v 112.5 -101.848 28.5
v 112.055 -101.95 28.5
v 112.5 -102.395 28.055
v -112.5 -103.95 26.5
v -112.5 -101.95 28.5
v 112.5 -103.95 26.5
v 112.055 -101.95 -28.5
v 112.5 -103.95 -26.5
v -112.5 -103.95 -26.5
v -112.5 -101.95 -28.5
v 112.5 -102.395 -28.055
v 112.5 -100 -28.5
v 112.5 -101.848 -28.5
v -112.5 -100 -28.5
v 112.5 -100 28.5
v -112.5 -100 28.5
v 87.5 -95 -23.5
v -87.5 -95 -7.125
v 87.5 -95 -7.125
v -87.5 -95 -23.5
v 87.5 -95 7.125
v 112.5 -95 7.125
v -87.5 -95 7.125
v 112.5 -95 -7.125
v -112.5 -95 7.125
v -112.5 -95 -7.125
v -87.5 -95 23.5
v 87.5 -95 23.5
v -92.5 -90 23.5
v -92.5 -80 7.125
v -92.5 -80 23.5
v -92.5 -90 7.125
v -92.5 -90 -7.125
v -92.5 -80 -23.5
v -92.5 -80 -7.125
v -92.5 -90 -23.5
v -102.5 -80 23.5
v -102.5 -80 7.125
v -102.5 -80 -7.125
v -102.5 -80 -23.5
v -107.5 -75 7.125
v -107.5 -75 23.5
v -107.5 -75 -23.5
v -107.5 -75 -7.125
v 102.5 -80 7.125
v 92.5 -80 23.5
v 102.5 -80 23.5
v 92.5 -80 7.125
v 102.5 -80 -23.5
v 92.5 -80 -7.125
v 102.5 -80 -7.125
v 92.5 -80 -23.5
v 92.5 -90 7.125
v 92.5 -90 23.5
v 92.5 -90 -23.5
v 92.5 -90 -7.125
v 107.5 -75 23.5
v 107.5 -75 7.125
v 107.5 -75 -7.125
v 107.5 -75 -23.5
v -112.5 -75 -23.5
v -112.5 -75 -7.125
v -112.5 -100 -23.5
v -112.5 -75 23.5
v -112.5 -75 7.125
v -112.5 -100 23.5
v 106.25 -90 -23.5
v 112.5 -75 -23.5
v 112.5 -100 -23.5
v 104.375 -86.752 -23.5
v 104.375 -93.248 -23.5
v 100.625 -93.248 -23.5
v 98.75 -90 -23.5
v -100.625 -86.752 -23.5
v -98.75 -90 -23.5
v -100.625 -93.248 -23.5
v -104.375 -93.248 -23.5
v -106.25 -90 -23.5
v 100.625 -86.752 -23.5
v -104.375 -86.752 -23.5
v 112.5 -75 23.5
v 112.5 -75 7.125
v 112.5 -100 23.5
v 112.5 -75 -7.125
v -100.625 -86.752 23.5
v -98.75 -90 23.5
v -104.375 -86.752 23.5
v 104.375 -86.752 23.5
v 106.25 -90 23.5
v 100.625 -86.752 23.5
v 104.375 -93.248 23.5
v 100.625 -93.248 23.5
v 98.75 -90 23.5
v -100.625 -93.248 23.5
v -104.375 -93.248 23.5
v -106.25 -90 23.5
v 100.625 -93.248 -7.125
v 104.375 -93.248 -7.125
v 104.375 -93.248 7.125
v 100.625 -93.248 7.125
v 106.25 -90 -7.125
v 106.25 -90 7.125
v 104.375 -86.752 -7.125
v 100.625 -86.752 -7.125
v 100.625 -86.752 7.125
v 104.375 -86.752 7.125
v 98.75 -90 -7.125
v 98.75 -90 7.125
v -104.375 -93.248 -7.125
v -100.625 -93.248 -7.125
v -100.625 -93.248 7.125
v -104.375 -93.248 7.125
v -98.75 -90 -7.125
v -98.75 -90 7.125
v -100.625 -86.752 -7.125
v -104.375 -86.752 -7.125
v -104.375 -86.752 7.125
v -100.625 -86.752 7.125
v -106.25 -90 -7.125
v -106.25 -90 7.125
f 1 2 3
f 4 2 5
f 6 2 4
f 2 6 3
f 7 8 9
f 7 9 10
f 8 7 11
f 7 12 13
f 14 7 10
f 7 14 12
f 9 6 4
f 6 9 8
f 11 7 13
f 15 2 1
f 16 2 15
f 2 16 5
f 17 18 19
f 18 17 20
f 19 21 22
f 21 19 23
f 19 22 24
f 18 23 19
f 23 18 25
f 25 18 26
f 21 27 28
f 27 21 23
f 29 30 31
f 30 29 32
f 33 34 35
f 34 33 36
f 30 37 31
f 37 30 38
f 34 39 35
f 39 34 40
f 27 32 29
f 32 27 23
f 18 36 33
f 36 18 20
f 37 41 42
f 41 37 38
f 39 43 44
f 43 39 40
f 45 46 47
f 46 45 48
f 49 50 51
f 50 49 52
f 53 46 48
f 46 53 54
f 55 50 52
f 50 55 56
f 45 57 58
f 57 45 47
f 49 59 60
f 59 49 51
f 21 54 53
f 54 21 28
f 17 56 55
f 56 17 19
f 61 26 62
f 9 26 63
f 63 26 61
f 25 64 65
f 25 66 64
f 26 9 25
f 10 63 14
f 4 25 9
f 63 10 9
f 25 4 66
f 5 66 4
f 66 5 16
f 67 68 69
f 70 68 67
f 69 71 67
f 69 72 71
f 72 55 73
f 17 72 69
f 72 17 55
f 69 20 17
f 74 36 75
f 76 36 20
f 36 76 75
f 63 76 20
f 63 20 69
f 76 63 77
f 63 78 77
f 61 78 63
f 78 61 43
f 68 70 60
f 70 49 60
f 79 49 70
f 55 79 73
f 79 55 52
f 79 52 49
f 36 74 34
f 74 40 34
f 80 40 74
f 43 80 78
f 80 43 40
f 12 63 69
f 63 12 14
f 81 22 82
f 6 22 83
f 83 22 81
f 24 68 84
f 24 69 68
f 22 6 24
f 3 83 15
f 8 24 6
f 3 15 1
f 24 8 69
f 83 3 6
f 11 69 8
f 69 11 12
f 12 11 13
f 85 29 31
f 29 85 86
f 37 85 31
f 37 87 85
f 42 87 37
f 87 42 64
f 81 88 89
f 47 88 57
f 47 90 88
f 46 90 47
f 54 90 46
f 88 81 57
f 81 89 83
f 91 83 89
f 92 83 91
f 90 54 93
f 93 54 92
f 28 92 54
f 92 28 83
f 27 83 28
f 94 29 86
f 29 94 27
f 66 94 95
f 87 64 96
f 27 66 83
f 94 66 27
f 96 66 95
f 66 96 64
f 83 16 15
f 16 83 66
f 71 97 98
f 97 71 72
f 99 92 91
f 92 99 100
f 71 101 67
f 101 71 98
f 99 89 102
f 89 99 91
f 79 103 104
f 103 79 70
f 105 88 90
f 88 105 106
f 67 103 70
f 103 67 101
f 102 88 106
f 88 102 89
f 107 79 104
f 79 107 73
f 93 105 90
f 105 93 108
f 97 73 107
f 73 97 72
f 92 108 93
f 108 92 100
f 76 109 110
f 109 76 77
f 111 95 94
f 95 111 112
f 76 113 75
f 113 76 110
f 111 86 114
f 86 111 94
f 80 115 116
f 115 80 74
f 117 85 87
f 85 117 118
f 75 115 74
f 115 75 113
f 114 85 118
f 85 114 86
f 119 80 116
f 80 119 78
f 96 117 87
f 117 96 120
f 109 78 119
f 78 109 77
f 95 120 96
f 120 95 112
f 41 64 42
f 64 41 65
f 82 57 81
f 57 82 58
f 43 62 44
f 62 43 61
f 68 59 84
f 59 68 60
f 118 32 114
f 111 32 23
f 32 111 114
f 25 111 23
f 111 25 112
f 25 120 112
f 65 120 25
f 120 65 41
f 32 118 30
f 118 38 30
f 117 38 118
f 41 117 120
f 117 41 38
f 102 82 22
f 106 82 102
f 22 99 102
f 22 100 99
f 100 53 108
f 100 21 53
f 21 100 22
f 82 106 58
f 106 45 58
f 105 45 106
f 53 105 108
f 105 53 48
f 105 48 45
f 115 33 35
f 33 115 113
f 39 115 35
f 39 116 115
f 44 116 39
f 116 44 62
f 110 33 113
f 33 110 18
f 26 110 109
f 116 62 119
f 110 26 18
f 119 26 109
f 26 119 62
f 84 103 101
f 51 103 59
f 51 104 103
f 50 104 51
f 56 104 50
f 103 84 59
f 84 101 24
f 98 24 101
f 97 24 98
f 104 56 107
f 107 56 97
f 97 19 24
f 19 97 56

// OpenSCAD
// file: frame-left.scad
/*
 * SPDX-FileCopyrightText: © 2023 Brian S. Stephan <bss@incorporeal.org>
 * SPDX-License-Identifier: GPL-3.0-or-later
 */

include <parameters.scad>
include <components.scad>

module base_left_frame(lower=false) {
	difference() {
		frame(lower=lower);
		// chop the right edge off
		side_chopper();
	}
}

module left_frame(lower=false) {
	difference() {
		base_left_frame(lower=lower);
		// connection holes to other frames
		frame_connection_holes();

		// cable routing hole
		frame_cable_routing_hole();

		// aux button holes
		translate([-35, 101.5, 0]) rotate([270, 0, 0]) aux_control_three_button_cluster();
		translate([-35, (frame_y/2)-neutrik_panel_thickness-4, 0]) frame_cutout();
		translate([-72, (frame_y/2)-neutrik_panel_thickness-4, 0]) frame_cutout();
		translate([2, (frame_y/2)-neutrik_panel_thickness-4, 0]) frame_cutout();

		// neutrix button hole
		translate([frame_center_to_neutrik, (frame_y/2)-neutrik_panel_thickness, 0])
			rotate([90, 0, 0]) neutrik_d_mount();
		translate([frame_center_to_neutrik, (frame_y/2)-neutrik_panel_thickness-4, 0])
			frame_cutout();
	}
}

left_frame();
// file: parameters.scad
/*
 * SPDX-FileCopyrightText: © 2023 Brian S. Stephan <bss@incorporeal.org>
 * SPDX-License-Identifier: GPL-3.0-or-later
 */

// adjustments
hole_tolerance = 0.15;

// M2
m2_screw_selftap_radius = 0.95;

// M3
m3_screw_selftap_radius = 1.3;

// M4
m4_bolt_radius = 2 + hole_tolerance;
m4_bolt_countersink_radius = 6.1 + hole_tolerance;
m4_bolt_hex_exterior_radius = 3.6 + hole_tolerance;

// 24mm button
small_button_radius = 12 + hole_tolerance;

// 30mm button
big_button_radius = 15 + hole_tolerance;

// JLF mount dimensions
lever_mount_x = 53;
lever_mount_y = 95;
lever_mount_z = 2;

// standard lever hole
lever_plate_hole = 12;

// korean lever hole
korean_lever_plate_hole = 17.6;

// case dimensions
// base frame box. reminder: top of inside (including mounts) is chopped by panel_z for plates
frame_x = 233;
frame_y = 208;
frame_z = 57;

// degree to which the extended frame pieces stick out from the end of the frame
frame_extension_x = 25;
frame_extension_y = 25;

// this sinks the bottom and top of the frame inward a bit, and is used to math out two shapes
// when creating the frame box / overhang panel
frame_bevel_height = 2;
overhang_panel_bevel_height = 1;

frame_center_to_neutrik = 70;

// depth of the "lip" of the frame that the top plate sets into/supports the overhang
frame_wall = 4;

// width of the column in the frame corners to support the hex bolt
frame_mount_column_width = 20;

// per neutrik (mm)
neutrik_panel_thickness = 3;

// top plate, which can either be the whole plate ("inset") or the mounting frame for a plate that overhangs
panel_x = frame_x - (frame_wall * 2);
panel_y = frame_y - (frame_wall * 2);
panel_z = 5;

// how much the top plate x/y is expanded to overhang the frame
// note that this is relative to the top plate (so the wall is added back)
panel_overhang_amount = 8.5;
overhang_panel_x = panel_x + (frame_wall * 2) + (panel_overhang_amount * 2);
overhang_panel_y = panel_y + (frame_wall * 2) + (panel_overhang_amount * 2);

panel_to_frame_point_x = (panel_x/2)-10;
panel_to_frame_point_y = (panel_y/2)-10;

// frame interior that supports the top plates
panel_support_width = 5;

// neutrik D screw holes
neutrik_d_screw_radius = 1.6 + hole_tolerance;
neutrik_d_radius = 12 + hole_tolerance;

// GX 16 holes
gx16_radius = 7.8 + hole_tolerance;

// additional button radius for decorative panels, etc.
decorative_radius_scale = 1.75;
jumbo_decorative_radius_scale = 2;
// main file
/*
 * SPDX-FileCopyrightText: © 2024 Brian S. Stephan <bss@incorporeal.org>
 * SPDX-License-Identifier: GPL-3.0-or-later
 */

include <parameters.scad>
include <components.scad>
use <frame-left.scad>

module bottom_left_or_right_frame_piece(lower=false) {
	piece_width = panel_support_width+frame_wall+frame_mount_column_width;
	intersection() {
		left_frame(lower=lower);
		difference() {
			// include the whole bottom wall (including mount columns)
			translate([0, -(frame_y/2)+(piece_width/2), 0]) cube([frame_x, piece_width, frame_z], center=true);
			// ...minus the frame wall and lip on the left
			translate([-frame_x/2+frame_wall/2, 0, 0])
				cube([frame_wall, frame_y, frame_z], center=true);
			// ...minus a slot for the combining piece to go into
			cube([frame_x, frame_y-(panel_support_width+frame_wall)*2, frame_z/4], center=true);
		}
	}
}

bottom_left_or_right_frame_piece();
